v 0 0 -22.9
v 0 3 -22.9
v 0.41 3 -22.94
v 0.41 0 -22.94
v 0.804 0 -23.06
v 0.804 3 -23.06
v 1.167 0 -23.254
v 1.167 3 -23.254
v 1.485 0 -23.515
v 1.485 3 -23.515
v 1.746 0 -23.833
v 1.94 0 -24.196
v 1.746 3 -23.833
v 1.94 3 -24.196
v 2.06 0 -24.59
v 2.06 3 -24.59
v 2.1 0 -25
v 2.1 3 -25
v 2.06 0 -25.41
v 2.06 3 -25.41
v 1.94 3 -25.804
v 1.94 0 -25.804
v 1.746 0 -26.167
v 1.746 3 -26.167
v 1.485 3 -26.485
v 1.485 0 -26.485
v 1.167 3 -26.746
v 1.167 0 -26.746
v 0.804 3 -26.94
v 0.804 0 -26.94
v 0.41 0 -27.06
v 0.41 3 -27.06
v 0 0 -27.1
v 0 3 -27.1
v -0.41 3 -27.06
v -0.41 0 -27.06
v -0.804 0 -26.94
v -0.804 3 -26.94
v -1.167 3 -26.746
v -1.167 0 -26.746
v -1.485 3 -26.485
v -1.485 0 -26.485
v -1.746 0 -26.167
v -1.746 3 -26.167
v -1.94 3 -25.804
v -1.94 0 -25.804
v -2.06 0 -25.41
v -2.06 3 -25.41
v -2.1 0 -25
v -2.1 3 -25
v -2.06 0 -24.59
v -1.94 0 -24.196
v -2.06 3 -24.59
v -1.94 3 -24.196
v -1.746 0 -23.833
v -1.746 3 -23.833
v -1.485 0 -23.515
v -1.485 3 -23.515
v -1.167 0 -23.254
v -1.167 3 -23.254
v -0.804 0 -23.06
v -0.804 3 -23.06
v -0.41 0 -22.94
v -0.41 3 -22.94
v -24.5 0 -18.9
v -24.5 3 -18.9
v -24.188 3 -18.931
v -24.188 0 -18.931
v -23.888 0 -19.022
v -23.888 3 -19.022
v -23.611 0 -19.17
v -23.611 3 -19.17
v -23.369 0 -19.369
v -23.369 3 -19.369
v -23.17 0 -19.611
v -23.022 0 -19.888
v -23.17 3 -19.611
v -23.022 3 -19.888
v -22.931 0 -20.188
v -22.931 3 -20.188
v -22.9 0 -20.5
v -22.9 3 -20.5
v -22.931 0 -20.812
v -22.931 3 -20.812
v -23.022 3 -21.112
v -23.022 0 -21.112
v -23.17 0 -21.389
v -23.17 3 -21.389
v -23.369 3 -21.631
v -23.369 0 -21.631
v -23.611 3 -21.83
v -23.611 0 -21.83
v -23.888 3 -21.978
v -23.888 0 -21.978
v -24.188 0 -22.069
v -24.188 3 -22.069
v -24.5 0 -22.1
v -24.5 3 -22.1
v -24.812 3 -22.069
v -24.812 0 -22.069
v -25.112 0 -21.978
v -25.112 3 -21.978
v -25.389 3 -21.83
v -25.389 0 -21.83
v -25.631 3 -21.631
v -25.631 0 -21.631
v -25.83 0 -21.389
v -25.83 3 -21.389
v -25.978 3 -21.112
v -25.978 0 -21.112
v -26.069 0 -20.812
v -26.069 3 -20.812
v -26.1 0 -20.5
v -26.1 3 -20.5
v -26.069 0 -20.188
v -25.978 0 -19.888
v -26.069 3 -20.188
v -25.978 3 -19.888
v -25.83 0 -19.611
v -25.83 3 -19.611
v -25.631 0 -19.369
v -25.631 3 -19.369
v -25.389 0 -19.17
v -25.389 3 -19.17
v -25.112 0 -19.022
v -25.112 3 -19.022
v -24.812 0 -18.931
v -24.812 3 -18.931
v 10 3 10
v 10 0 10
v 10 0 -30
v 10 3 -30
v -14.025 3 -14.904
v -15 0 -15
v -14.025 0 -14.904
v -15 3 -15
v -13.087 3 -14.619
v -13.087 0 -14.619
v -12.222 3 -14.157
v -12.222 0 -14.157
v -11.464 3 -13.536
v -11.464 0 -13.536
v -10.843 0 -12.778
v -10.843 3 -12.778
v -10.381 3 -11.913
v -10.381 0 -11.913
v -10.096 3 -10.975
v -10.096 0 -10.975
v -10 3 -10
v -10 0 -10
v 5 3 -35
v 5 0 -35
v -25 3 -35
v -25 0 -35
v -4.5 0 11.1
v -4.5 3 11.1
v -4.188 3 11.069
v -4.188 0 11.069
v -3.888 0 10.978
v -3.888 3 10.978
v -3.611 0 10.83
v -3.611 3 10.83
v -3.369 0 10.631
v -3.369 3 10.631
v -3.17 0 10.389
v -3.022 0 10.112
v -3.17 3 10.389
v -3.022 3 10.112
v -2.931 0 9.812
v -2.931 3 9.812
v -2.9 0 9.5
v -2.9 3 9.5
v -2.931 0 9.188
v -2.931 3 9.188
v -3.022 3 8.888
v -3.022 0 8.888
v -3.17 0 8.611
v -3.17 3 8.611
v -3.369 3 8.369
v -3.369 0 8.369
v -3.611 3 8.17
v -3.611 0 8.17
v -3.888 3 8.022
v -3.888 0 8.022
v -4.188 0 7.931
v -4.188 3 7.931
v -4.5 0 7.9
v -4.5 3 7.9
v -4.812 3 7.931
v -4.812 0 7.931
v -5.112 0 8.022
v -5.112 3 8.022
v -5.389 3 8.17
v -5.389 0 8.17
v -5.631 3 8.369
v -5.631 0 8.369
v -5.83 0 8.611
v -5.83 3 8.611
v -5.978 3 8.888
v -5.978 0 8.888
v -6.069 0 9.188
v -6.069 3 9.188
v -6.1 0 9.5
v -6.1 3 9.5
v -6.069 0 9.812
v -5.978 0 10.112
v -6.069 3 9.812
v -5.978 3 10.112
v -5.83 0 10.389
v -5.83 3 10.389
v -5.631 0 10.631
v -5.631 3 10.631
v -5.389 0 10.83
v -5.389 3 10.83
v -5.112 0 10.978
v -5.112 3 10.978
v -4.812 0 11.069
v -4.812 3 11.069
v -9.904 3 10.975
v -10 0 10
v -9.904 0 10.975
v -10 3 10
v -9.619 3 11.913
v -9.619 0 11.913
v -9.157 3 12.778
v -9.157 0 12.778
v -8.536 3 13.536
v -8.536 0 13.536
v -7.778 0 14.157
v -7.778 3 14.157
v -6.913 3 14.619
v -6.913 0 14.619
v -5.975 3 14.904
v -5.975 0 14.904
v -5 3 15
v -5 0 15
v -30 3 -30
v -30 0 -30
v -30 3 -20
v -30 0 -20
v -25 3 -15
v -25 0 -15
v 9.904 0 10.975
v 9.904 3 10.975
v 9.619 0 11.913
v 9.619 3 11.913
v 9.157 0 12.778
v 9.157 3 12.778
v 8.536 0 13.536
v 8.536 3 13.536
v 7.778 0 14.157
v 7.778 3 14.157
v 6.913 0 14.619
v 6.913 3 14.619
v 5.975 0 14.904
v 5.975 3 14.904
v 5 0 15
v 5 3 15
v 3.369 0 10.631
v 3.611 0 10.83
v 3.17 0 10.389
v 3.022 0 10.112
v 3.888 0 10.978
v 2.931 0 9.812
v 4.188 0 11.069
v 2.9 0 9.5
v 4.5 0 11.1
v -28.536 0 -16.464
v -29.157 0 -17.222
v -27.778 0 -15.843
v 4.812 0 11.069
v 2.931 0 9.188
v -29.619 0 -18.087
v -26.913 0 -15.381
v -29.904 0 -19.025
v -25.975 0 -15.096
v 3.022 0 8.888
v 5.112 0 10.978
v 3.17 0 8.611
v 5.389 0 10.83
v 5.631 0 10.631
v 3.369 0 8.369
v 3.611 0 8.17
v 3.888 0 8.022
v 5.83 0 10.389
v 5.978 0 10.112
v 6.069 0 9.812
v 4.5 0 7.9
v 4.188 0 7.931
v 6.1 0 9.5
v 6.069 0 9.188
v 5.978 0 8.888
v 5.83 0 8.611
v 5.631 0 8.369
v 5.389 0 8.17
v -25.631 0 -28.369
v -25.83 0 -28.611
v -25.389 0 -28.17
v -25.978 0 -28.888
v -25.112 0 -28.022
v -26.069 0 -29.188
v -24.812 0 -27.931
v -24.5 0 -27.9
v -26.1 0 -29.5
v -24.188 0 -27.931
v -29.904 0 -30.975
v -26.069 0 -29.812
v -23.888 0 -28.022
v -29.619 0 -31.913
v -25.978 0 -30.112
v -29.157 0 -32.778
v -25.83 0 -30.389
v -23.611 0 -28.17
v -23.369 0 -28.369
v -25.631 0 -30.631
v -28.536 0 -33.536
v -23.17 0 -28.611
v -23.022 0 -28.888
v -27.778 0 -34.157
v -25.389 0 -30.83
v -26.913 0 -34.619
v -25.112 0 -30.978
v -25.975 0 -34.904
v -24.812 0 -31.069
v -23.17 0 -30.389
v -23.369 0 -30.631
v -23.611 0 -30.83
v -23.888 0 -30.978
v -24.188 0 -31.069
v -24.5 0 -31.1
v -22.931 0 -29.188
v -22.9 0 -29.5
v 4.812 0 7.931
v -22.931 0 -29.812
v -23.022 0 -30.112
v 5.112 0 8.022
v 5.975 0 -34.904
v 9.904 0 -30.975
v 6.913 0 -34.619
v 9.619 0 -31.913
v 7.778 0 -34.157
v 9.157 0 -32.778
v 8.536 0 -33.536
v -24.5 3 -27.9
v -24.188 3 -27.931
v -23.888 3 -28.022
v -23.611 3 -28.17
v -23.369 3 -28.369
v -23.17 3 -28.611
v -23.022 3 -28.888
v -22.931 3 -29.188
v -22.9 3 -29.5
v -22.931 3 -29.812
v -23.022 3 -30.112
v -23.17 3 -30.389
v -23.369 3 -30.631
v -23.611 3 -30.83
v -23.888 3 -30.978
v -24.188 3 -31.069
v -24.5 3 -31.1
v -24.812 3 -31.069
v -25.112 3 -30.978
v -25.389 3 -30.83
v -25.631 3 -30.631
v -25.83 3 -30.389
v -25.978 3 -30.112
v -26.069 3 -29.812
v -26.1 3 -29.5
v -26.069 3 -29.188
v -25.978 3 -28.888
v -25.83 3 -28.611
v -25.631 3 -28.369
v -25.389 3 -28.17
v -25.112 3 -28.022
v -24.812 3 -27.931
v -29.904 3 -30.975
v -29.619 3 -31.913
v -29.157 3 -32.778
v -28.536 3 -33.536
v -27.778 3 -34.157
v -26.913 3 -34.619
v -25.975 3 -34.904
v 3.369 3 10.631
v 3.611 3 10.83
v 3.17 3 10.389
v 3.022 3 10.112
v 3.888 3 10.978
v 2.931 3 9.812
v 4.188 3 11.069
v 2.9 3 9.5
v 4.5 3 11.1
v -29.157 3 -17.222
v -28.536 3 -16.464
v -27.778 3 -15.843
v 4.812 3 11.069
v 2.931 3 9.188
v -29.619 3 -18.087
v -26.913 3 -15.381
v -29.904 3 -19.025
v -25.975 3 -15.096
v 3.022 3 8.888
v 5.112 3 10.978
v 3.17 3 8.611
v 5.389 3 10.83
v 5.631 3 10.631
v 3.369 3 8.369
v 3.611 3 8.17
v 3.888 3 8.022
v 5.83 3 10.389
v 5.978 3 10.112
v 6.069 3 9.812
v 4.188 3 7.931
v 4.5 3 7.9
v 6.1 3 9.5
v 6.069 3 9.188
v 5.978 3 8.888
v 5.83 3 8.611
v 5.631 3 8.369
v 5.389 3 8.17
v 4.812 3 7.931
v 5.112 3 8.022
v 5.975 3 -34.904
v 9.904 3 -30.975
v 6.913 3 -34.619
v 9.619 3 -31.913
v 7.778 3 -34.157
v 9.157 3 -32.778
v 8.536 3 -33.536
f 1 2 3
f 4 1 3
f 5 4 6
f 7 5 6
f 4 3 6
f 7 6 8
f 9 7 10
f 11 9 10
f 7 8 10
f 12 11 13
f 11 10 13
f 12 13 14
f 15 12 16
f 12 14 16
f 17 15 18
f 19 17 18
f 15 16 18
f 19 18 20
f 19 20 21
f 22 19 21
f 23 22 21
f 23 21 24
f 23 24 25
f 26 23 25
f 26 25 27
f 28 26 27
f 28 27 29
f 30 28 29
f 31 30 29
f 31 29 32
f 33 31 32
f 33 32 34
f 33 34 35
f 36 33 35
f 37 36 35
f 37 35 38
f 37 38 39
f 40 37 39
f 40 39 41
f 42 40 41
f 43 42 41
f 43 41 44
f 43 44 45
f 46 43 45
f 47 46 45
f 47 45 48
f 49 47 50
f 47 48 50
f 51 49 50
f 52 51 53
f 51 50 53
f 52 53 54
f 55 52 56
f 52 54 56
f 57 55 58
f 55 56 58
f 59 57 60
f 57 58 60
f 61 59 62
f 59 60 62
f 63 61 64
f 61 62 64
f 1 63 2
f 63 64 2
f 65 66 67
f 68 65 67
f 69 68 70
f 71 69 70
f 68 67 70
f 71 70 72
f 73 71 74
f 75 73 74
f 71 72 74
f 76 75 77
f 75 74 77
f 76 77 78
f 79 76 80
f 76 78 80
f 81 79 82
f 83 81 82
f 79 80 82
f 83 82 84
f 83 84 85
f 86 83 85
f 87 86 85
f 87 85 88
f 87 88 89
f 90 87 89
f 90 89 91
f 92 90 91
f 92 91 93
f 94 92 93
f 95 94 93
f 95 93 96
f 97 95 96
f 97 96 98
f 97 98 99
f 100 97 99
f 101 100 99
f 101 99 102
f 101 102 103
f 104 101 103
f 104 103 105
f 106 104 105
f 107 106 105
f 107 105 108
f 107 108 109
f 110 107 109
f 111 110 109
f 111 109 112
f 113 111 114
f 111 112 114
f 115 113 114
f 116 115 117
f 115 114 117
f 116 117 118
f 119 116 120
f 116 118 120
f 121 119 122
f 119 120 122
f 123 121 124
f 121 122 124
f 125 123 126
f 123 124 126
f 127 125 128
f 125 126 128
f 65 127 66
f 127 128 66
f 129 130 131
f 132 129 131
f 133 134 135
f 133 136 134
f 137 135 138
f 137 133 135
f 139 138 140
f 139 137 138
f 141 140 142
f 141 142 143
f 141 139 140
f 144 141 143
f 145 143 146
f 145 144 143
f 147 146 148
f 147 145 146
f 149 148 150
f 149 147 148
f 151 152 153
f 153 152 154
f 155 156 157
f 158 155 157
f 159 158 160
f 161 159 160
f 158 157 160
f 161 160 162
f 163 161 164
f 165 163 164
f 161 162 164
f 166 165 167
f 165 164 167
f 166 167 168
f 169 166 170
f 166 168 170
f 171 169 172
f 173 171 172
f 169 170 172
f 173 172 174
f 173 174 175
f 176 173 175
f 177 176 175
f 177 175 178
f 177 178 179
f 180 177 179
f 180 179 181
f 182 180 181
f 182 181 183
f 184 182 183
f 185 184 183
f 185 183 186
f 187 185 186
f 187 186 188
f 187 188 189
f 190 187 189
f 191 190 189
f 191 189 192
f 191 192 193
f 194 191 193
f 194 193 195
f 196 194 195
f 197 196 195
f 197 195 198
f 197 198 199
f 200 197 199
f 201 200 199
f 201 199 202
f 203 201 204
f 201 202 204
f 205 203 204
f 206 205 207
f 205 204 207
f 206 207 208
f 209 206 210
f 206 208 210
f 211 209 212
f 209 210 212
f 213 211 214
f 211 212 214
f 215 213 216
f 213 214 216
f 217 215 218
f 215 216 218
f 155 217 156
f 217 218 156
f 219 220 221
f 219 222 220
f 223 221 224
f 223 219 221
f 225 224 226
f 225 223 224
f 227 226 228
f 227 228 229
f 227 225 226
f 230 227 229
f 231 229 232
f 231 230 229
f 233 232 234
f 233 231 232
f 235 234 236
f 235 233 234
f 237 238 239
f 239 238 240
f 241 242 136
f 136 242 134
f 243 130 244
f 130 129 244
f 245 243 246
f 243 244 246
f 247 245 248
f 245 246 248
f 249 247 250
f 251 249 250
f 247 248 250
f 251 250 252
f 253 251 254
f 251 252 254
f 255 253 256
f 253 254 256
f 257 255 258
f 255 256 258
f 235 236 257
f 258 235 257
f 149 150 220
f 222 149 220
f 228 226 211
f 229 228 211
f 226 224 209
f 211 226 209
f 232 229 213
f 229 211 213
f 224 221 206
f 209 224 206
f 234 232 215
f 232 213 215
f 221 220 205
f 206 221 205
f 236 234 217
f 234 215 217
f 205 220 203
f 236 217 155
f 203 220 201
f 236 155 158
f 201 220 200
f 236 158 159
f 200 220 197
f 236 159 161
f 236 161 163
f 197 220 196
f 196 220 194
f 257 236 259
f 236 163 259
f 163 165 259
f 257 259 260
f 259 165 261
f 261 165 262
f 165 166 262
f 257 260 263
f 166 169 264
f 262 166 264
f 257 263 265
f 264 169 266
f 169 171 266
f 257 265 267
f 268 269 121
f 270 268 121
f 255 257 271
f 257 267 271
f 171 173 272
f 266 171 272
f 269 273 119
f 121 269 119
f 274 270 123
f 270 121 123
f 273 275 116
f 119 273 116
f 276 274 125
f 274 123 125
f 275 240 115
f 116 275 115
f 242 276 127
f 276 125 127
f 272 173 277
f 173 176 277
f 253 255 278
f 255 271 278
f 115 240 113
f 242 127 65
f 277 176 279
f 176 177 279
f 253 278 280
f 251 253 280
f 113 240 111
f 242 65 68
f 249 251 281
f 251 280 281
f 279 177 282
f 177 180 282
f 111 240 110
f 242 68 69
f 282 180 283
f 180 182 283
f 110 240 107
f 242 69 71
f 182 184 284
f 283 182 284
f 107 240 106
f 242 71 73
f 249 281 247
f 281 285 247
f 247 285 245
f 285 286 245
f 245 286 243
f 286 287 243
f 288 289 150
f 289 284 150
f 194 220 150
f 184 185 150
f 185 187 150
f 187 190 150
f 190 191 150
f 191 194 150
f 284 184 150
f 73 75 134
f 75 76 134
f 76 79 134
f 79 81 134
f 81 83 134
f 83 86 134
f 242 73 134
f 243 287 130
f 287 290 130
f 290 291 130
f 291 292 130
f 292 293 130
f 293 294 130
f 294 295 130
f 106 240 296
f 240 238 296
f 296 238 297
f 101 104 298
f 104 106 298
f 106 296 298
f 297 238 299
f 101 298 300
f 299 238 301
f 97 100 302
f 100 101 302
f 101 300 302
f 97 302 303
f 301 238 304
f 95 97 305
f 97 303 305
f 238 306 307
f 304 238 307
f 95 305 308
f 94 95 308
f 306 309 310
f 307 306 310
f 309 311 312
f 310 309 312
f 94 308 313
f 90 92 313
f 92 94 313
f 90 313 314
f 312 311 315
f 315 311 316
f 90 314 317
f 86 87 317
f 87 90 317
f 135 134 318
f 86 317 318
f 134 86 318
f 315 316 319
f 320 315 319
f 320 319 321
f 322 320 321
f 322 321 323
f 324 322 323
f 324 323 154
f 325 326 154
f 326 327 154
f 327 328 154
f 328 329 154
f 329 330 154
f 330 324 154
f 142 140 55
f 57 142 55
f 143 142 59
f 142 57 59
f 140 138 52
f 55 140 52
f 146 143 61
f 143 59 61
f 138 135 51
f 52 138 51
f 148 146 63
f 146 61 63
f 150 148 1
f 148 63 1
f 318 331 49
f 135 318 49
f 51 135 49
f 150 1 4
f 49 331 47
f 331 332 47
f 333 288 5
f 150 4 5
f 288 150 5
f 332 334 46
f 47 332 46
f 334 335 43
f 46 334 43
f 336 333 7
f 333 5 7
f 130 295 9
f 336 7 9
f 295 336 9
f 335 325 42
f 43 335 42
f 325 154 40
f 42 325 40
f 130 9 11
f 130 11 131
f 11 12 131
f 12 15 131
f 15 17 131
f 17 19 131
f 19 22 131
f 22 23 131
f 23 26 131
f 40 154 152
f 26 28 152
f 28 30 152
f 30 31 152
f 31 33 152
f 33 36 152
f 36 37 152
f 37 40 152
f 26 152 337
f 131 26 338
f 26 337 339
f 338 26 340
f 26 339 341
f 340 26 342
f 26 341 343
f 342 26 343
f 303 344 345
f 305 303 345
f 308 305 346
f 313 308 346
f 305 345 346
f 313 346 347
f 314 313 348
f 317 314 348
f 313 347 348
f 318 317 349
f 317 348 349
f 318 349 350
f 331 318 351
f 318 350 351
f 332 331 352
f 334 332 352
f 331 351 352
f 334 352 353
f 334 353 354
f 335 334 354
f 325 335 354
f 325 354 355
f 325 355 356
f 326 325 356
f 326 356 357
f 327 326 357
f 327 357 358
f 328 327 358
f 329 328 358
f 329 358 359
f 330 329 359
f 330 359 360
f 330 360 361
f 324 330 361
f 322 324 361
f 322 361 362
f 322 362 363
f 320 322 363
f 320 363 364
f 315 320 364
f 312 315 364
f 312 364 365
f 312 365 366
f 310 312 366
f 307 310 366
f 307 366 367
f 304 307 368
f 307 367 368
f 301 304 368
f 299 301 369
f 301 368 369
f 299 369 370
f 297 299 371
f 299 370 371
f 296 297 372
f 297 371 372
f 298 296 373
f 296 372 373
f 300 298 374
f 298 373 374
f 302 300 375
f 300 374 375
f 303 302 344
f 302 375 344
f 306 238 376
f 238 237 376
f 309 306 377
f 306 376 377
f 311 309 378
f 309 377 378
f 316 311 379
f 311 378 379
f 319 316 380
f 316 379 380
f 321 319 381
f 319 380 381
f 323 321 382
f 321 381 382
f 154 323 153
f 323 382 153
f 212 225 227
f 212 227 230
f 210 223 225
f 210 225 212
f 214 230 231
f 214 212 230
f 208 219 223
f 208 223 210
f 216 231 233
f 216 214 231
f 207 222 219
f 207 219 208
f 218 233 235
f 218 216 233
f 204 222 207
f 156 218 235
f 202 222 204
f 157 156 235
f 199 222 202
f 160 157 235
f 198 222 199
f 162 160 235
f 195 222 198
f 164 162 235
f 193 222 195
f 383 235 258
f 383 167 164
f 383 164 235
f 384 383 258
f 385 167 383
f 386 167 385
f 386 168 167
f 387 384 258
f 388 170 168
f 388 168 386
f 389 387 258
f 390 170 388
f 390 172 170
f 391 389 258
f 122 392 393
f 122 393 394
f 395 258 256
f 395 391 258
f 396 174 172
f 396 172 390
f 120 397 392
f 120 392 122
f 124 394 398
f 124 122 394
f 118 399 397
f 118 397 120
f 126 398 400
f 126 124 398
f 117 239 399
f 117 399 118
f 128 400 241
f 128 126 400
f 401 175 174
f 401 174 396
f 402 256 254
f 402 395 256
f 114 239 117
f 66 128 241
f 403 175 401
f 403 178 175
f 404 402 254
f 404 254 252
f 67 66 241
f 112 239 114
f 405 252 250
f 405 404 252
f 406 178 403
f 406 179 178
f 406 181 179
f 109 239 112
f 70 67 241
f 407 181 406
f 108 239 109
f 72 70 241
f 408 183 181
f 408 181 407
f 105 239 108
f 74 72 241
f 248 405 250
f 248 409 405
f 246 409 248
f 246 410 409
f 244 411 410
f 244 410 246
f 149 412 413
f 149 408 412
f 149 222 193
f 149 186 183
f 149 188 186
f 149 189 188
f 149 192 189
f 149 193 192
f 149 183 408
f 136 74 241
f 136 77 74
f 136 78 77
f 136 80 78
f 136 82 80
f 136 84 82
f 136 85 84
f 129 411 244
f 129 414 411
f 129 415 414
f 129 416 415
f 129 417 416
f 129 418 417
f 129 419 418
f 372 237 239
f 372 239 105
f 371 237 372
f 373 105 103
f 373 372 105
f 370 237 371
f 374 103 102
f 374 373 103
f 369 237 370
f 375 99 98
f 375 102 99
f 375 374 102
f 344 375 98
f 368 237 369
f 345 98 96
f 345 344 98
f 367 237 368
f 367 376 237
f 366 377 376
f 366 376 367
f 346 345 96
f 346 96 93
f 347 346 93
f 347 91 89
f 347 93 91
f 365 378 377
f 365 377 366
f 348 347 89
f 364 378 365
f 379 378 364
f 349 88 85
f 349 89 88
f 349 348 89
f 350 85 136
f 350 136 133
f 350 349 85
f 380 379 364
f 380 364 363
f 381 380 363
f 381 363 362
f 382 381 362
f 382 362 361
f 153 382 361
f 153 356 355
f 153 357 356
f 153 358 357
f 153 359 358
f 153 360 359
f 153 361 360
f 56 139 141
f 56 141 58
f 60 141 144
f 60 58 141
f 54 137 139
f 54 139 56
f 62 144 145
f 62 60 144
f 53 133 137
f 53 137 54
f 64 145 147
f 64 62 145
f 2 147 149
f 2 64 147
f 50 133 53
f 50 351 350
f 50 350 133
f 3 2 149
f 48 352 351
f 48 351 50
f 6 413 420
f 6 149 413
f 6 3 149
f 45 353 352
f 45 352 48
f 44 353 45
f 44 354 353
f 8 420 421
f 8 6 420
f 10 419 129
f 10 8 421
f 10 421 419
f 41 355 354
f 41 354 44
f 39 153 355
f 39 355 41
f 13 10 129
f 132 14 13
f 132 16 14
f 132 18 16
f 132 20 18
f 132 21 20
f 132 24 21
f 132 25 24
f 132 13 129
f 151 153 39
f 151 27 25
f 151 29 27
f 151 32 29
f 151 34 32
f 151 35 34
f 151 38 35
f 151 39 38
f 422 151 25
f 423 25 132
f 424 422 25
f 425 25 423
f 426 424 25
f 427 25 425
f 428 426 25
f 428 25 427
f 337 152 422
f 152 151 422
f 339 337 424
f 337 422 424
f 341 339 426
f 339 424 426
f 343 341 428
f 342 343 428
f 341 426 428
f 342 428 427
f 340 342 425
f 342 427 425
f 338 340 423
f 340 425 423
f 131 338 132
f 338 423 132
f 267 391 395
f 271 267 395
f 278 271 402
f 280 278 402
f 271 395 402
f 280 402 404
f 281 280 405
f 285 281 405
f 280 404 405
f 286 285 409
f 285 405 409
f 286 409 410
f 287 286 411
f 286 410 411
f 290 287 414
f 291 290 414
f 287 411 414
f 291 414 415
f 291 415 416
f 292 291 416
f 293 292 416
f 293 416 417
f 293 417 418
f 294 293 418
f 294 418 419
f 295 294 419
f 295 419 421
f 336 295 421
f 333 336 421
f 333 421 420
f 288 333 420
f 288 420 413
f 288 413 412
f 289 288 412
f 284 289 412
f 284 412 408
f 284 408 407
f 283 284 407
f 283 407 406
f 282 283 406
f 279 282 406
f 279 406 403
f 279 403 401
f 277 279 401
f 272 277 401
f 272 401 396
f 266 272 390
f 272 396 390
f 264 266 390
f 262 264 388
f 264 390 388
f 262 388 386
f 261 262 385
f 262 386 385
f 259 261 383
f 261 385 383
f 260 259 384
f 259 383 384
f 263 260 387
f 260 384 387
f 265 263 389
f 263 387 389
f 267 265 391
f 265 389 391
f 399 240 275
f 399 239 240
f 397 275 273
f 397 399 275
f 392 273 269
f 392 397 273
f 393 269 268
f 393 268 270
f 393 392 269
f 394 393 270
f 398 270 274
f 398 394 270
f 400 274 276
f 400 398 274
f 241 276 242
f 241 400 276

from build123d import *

# Parameters (mm, degrees)
EXTRUDE_1_DEPTH     = 3
SKETCH_2_R          = 1.6
CUT_EXTRUDE_1_DEPTH = 47.19523785
FILLET_1_R          = 5
SKETCH_3_R          = 2.1
CUT_EXTRUDE_2_DEPTH = 47.19523785


with BuildPart() as part:
    # 草图1 → 凸台-拉伸1 (new body)
    with BuildSketch(Plane(origin=(0, 0, 0), x_dir=(1, 0, 0), z_dir=(0, 1, 0))):
        Polygon((-30, 35), (-30, 15), (-10, 15), (-10, -15), (10, -15), (10, 35), align=None)
    extrude(amount=EXTRUDE_1_DEPTH)

    # 草图2 → 切除-拉伸1 (cut, through all)
    with BuildSketch(Plane(origin=(0, 3, 0), x_dir=(1, 0, 0), z_dir=(0, 1, 0))):
        with Locations(Location((-24.5, 29.5, 0), (0, 0, 270))):
            Circle(SKETCH_2_R)
        with Locations(Location((-24.5, 20.5, 0), (0, 0, 270))):
            Circle(SKETCH_2_R)
        with Locations(Location((-4.5, -9.5, 0), (0, 0, 270))):
            Circle(SKETCH_2_R)
        with Locations(Location((4.5, -9.5, 0), (0, 0, 270))):
            Circle(SKETCH_2_R)
    extrude(amount=-CUT_EXTRUDE_1_DEPTH, mode=Mode.SUBTRACT)

    # 圆角1
    fillet_1_edges = [part.edges().sort_by_distance(p)[0] for p in [
        (10, 1.5, 15),
        (-10, 1.5, 15),
        (-10, 1.5, -15),
        (-30, 1.5, -15),
        (-30, 1.5, -35),
        (10, 1.5, -35),
    ]]
    fillet(fillet_1_edges, radius=FILLET_1_R)

    # 草图3 → 切除-拉伸2 (cut, through all)
    with BuildSketch(Plane(origin=(0, 3, 0), x_dir=(1, 0, 0), z_dir=(0, 1, 0))):
        with Locations(Location((0, 25, 0), (0, 0, 270))):
            Circle(SKETCH_3_R)
    extrude(amount=-CUT_EXTRUDE_2_DEPTH, mode=Mode.SUBTRACT)


solid = part.part
